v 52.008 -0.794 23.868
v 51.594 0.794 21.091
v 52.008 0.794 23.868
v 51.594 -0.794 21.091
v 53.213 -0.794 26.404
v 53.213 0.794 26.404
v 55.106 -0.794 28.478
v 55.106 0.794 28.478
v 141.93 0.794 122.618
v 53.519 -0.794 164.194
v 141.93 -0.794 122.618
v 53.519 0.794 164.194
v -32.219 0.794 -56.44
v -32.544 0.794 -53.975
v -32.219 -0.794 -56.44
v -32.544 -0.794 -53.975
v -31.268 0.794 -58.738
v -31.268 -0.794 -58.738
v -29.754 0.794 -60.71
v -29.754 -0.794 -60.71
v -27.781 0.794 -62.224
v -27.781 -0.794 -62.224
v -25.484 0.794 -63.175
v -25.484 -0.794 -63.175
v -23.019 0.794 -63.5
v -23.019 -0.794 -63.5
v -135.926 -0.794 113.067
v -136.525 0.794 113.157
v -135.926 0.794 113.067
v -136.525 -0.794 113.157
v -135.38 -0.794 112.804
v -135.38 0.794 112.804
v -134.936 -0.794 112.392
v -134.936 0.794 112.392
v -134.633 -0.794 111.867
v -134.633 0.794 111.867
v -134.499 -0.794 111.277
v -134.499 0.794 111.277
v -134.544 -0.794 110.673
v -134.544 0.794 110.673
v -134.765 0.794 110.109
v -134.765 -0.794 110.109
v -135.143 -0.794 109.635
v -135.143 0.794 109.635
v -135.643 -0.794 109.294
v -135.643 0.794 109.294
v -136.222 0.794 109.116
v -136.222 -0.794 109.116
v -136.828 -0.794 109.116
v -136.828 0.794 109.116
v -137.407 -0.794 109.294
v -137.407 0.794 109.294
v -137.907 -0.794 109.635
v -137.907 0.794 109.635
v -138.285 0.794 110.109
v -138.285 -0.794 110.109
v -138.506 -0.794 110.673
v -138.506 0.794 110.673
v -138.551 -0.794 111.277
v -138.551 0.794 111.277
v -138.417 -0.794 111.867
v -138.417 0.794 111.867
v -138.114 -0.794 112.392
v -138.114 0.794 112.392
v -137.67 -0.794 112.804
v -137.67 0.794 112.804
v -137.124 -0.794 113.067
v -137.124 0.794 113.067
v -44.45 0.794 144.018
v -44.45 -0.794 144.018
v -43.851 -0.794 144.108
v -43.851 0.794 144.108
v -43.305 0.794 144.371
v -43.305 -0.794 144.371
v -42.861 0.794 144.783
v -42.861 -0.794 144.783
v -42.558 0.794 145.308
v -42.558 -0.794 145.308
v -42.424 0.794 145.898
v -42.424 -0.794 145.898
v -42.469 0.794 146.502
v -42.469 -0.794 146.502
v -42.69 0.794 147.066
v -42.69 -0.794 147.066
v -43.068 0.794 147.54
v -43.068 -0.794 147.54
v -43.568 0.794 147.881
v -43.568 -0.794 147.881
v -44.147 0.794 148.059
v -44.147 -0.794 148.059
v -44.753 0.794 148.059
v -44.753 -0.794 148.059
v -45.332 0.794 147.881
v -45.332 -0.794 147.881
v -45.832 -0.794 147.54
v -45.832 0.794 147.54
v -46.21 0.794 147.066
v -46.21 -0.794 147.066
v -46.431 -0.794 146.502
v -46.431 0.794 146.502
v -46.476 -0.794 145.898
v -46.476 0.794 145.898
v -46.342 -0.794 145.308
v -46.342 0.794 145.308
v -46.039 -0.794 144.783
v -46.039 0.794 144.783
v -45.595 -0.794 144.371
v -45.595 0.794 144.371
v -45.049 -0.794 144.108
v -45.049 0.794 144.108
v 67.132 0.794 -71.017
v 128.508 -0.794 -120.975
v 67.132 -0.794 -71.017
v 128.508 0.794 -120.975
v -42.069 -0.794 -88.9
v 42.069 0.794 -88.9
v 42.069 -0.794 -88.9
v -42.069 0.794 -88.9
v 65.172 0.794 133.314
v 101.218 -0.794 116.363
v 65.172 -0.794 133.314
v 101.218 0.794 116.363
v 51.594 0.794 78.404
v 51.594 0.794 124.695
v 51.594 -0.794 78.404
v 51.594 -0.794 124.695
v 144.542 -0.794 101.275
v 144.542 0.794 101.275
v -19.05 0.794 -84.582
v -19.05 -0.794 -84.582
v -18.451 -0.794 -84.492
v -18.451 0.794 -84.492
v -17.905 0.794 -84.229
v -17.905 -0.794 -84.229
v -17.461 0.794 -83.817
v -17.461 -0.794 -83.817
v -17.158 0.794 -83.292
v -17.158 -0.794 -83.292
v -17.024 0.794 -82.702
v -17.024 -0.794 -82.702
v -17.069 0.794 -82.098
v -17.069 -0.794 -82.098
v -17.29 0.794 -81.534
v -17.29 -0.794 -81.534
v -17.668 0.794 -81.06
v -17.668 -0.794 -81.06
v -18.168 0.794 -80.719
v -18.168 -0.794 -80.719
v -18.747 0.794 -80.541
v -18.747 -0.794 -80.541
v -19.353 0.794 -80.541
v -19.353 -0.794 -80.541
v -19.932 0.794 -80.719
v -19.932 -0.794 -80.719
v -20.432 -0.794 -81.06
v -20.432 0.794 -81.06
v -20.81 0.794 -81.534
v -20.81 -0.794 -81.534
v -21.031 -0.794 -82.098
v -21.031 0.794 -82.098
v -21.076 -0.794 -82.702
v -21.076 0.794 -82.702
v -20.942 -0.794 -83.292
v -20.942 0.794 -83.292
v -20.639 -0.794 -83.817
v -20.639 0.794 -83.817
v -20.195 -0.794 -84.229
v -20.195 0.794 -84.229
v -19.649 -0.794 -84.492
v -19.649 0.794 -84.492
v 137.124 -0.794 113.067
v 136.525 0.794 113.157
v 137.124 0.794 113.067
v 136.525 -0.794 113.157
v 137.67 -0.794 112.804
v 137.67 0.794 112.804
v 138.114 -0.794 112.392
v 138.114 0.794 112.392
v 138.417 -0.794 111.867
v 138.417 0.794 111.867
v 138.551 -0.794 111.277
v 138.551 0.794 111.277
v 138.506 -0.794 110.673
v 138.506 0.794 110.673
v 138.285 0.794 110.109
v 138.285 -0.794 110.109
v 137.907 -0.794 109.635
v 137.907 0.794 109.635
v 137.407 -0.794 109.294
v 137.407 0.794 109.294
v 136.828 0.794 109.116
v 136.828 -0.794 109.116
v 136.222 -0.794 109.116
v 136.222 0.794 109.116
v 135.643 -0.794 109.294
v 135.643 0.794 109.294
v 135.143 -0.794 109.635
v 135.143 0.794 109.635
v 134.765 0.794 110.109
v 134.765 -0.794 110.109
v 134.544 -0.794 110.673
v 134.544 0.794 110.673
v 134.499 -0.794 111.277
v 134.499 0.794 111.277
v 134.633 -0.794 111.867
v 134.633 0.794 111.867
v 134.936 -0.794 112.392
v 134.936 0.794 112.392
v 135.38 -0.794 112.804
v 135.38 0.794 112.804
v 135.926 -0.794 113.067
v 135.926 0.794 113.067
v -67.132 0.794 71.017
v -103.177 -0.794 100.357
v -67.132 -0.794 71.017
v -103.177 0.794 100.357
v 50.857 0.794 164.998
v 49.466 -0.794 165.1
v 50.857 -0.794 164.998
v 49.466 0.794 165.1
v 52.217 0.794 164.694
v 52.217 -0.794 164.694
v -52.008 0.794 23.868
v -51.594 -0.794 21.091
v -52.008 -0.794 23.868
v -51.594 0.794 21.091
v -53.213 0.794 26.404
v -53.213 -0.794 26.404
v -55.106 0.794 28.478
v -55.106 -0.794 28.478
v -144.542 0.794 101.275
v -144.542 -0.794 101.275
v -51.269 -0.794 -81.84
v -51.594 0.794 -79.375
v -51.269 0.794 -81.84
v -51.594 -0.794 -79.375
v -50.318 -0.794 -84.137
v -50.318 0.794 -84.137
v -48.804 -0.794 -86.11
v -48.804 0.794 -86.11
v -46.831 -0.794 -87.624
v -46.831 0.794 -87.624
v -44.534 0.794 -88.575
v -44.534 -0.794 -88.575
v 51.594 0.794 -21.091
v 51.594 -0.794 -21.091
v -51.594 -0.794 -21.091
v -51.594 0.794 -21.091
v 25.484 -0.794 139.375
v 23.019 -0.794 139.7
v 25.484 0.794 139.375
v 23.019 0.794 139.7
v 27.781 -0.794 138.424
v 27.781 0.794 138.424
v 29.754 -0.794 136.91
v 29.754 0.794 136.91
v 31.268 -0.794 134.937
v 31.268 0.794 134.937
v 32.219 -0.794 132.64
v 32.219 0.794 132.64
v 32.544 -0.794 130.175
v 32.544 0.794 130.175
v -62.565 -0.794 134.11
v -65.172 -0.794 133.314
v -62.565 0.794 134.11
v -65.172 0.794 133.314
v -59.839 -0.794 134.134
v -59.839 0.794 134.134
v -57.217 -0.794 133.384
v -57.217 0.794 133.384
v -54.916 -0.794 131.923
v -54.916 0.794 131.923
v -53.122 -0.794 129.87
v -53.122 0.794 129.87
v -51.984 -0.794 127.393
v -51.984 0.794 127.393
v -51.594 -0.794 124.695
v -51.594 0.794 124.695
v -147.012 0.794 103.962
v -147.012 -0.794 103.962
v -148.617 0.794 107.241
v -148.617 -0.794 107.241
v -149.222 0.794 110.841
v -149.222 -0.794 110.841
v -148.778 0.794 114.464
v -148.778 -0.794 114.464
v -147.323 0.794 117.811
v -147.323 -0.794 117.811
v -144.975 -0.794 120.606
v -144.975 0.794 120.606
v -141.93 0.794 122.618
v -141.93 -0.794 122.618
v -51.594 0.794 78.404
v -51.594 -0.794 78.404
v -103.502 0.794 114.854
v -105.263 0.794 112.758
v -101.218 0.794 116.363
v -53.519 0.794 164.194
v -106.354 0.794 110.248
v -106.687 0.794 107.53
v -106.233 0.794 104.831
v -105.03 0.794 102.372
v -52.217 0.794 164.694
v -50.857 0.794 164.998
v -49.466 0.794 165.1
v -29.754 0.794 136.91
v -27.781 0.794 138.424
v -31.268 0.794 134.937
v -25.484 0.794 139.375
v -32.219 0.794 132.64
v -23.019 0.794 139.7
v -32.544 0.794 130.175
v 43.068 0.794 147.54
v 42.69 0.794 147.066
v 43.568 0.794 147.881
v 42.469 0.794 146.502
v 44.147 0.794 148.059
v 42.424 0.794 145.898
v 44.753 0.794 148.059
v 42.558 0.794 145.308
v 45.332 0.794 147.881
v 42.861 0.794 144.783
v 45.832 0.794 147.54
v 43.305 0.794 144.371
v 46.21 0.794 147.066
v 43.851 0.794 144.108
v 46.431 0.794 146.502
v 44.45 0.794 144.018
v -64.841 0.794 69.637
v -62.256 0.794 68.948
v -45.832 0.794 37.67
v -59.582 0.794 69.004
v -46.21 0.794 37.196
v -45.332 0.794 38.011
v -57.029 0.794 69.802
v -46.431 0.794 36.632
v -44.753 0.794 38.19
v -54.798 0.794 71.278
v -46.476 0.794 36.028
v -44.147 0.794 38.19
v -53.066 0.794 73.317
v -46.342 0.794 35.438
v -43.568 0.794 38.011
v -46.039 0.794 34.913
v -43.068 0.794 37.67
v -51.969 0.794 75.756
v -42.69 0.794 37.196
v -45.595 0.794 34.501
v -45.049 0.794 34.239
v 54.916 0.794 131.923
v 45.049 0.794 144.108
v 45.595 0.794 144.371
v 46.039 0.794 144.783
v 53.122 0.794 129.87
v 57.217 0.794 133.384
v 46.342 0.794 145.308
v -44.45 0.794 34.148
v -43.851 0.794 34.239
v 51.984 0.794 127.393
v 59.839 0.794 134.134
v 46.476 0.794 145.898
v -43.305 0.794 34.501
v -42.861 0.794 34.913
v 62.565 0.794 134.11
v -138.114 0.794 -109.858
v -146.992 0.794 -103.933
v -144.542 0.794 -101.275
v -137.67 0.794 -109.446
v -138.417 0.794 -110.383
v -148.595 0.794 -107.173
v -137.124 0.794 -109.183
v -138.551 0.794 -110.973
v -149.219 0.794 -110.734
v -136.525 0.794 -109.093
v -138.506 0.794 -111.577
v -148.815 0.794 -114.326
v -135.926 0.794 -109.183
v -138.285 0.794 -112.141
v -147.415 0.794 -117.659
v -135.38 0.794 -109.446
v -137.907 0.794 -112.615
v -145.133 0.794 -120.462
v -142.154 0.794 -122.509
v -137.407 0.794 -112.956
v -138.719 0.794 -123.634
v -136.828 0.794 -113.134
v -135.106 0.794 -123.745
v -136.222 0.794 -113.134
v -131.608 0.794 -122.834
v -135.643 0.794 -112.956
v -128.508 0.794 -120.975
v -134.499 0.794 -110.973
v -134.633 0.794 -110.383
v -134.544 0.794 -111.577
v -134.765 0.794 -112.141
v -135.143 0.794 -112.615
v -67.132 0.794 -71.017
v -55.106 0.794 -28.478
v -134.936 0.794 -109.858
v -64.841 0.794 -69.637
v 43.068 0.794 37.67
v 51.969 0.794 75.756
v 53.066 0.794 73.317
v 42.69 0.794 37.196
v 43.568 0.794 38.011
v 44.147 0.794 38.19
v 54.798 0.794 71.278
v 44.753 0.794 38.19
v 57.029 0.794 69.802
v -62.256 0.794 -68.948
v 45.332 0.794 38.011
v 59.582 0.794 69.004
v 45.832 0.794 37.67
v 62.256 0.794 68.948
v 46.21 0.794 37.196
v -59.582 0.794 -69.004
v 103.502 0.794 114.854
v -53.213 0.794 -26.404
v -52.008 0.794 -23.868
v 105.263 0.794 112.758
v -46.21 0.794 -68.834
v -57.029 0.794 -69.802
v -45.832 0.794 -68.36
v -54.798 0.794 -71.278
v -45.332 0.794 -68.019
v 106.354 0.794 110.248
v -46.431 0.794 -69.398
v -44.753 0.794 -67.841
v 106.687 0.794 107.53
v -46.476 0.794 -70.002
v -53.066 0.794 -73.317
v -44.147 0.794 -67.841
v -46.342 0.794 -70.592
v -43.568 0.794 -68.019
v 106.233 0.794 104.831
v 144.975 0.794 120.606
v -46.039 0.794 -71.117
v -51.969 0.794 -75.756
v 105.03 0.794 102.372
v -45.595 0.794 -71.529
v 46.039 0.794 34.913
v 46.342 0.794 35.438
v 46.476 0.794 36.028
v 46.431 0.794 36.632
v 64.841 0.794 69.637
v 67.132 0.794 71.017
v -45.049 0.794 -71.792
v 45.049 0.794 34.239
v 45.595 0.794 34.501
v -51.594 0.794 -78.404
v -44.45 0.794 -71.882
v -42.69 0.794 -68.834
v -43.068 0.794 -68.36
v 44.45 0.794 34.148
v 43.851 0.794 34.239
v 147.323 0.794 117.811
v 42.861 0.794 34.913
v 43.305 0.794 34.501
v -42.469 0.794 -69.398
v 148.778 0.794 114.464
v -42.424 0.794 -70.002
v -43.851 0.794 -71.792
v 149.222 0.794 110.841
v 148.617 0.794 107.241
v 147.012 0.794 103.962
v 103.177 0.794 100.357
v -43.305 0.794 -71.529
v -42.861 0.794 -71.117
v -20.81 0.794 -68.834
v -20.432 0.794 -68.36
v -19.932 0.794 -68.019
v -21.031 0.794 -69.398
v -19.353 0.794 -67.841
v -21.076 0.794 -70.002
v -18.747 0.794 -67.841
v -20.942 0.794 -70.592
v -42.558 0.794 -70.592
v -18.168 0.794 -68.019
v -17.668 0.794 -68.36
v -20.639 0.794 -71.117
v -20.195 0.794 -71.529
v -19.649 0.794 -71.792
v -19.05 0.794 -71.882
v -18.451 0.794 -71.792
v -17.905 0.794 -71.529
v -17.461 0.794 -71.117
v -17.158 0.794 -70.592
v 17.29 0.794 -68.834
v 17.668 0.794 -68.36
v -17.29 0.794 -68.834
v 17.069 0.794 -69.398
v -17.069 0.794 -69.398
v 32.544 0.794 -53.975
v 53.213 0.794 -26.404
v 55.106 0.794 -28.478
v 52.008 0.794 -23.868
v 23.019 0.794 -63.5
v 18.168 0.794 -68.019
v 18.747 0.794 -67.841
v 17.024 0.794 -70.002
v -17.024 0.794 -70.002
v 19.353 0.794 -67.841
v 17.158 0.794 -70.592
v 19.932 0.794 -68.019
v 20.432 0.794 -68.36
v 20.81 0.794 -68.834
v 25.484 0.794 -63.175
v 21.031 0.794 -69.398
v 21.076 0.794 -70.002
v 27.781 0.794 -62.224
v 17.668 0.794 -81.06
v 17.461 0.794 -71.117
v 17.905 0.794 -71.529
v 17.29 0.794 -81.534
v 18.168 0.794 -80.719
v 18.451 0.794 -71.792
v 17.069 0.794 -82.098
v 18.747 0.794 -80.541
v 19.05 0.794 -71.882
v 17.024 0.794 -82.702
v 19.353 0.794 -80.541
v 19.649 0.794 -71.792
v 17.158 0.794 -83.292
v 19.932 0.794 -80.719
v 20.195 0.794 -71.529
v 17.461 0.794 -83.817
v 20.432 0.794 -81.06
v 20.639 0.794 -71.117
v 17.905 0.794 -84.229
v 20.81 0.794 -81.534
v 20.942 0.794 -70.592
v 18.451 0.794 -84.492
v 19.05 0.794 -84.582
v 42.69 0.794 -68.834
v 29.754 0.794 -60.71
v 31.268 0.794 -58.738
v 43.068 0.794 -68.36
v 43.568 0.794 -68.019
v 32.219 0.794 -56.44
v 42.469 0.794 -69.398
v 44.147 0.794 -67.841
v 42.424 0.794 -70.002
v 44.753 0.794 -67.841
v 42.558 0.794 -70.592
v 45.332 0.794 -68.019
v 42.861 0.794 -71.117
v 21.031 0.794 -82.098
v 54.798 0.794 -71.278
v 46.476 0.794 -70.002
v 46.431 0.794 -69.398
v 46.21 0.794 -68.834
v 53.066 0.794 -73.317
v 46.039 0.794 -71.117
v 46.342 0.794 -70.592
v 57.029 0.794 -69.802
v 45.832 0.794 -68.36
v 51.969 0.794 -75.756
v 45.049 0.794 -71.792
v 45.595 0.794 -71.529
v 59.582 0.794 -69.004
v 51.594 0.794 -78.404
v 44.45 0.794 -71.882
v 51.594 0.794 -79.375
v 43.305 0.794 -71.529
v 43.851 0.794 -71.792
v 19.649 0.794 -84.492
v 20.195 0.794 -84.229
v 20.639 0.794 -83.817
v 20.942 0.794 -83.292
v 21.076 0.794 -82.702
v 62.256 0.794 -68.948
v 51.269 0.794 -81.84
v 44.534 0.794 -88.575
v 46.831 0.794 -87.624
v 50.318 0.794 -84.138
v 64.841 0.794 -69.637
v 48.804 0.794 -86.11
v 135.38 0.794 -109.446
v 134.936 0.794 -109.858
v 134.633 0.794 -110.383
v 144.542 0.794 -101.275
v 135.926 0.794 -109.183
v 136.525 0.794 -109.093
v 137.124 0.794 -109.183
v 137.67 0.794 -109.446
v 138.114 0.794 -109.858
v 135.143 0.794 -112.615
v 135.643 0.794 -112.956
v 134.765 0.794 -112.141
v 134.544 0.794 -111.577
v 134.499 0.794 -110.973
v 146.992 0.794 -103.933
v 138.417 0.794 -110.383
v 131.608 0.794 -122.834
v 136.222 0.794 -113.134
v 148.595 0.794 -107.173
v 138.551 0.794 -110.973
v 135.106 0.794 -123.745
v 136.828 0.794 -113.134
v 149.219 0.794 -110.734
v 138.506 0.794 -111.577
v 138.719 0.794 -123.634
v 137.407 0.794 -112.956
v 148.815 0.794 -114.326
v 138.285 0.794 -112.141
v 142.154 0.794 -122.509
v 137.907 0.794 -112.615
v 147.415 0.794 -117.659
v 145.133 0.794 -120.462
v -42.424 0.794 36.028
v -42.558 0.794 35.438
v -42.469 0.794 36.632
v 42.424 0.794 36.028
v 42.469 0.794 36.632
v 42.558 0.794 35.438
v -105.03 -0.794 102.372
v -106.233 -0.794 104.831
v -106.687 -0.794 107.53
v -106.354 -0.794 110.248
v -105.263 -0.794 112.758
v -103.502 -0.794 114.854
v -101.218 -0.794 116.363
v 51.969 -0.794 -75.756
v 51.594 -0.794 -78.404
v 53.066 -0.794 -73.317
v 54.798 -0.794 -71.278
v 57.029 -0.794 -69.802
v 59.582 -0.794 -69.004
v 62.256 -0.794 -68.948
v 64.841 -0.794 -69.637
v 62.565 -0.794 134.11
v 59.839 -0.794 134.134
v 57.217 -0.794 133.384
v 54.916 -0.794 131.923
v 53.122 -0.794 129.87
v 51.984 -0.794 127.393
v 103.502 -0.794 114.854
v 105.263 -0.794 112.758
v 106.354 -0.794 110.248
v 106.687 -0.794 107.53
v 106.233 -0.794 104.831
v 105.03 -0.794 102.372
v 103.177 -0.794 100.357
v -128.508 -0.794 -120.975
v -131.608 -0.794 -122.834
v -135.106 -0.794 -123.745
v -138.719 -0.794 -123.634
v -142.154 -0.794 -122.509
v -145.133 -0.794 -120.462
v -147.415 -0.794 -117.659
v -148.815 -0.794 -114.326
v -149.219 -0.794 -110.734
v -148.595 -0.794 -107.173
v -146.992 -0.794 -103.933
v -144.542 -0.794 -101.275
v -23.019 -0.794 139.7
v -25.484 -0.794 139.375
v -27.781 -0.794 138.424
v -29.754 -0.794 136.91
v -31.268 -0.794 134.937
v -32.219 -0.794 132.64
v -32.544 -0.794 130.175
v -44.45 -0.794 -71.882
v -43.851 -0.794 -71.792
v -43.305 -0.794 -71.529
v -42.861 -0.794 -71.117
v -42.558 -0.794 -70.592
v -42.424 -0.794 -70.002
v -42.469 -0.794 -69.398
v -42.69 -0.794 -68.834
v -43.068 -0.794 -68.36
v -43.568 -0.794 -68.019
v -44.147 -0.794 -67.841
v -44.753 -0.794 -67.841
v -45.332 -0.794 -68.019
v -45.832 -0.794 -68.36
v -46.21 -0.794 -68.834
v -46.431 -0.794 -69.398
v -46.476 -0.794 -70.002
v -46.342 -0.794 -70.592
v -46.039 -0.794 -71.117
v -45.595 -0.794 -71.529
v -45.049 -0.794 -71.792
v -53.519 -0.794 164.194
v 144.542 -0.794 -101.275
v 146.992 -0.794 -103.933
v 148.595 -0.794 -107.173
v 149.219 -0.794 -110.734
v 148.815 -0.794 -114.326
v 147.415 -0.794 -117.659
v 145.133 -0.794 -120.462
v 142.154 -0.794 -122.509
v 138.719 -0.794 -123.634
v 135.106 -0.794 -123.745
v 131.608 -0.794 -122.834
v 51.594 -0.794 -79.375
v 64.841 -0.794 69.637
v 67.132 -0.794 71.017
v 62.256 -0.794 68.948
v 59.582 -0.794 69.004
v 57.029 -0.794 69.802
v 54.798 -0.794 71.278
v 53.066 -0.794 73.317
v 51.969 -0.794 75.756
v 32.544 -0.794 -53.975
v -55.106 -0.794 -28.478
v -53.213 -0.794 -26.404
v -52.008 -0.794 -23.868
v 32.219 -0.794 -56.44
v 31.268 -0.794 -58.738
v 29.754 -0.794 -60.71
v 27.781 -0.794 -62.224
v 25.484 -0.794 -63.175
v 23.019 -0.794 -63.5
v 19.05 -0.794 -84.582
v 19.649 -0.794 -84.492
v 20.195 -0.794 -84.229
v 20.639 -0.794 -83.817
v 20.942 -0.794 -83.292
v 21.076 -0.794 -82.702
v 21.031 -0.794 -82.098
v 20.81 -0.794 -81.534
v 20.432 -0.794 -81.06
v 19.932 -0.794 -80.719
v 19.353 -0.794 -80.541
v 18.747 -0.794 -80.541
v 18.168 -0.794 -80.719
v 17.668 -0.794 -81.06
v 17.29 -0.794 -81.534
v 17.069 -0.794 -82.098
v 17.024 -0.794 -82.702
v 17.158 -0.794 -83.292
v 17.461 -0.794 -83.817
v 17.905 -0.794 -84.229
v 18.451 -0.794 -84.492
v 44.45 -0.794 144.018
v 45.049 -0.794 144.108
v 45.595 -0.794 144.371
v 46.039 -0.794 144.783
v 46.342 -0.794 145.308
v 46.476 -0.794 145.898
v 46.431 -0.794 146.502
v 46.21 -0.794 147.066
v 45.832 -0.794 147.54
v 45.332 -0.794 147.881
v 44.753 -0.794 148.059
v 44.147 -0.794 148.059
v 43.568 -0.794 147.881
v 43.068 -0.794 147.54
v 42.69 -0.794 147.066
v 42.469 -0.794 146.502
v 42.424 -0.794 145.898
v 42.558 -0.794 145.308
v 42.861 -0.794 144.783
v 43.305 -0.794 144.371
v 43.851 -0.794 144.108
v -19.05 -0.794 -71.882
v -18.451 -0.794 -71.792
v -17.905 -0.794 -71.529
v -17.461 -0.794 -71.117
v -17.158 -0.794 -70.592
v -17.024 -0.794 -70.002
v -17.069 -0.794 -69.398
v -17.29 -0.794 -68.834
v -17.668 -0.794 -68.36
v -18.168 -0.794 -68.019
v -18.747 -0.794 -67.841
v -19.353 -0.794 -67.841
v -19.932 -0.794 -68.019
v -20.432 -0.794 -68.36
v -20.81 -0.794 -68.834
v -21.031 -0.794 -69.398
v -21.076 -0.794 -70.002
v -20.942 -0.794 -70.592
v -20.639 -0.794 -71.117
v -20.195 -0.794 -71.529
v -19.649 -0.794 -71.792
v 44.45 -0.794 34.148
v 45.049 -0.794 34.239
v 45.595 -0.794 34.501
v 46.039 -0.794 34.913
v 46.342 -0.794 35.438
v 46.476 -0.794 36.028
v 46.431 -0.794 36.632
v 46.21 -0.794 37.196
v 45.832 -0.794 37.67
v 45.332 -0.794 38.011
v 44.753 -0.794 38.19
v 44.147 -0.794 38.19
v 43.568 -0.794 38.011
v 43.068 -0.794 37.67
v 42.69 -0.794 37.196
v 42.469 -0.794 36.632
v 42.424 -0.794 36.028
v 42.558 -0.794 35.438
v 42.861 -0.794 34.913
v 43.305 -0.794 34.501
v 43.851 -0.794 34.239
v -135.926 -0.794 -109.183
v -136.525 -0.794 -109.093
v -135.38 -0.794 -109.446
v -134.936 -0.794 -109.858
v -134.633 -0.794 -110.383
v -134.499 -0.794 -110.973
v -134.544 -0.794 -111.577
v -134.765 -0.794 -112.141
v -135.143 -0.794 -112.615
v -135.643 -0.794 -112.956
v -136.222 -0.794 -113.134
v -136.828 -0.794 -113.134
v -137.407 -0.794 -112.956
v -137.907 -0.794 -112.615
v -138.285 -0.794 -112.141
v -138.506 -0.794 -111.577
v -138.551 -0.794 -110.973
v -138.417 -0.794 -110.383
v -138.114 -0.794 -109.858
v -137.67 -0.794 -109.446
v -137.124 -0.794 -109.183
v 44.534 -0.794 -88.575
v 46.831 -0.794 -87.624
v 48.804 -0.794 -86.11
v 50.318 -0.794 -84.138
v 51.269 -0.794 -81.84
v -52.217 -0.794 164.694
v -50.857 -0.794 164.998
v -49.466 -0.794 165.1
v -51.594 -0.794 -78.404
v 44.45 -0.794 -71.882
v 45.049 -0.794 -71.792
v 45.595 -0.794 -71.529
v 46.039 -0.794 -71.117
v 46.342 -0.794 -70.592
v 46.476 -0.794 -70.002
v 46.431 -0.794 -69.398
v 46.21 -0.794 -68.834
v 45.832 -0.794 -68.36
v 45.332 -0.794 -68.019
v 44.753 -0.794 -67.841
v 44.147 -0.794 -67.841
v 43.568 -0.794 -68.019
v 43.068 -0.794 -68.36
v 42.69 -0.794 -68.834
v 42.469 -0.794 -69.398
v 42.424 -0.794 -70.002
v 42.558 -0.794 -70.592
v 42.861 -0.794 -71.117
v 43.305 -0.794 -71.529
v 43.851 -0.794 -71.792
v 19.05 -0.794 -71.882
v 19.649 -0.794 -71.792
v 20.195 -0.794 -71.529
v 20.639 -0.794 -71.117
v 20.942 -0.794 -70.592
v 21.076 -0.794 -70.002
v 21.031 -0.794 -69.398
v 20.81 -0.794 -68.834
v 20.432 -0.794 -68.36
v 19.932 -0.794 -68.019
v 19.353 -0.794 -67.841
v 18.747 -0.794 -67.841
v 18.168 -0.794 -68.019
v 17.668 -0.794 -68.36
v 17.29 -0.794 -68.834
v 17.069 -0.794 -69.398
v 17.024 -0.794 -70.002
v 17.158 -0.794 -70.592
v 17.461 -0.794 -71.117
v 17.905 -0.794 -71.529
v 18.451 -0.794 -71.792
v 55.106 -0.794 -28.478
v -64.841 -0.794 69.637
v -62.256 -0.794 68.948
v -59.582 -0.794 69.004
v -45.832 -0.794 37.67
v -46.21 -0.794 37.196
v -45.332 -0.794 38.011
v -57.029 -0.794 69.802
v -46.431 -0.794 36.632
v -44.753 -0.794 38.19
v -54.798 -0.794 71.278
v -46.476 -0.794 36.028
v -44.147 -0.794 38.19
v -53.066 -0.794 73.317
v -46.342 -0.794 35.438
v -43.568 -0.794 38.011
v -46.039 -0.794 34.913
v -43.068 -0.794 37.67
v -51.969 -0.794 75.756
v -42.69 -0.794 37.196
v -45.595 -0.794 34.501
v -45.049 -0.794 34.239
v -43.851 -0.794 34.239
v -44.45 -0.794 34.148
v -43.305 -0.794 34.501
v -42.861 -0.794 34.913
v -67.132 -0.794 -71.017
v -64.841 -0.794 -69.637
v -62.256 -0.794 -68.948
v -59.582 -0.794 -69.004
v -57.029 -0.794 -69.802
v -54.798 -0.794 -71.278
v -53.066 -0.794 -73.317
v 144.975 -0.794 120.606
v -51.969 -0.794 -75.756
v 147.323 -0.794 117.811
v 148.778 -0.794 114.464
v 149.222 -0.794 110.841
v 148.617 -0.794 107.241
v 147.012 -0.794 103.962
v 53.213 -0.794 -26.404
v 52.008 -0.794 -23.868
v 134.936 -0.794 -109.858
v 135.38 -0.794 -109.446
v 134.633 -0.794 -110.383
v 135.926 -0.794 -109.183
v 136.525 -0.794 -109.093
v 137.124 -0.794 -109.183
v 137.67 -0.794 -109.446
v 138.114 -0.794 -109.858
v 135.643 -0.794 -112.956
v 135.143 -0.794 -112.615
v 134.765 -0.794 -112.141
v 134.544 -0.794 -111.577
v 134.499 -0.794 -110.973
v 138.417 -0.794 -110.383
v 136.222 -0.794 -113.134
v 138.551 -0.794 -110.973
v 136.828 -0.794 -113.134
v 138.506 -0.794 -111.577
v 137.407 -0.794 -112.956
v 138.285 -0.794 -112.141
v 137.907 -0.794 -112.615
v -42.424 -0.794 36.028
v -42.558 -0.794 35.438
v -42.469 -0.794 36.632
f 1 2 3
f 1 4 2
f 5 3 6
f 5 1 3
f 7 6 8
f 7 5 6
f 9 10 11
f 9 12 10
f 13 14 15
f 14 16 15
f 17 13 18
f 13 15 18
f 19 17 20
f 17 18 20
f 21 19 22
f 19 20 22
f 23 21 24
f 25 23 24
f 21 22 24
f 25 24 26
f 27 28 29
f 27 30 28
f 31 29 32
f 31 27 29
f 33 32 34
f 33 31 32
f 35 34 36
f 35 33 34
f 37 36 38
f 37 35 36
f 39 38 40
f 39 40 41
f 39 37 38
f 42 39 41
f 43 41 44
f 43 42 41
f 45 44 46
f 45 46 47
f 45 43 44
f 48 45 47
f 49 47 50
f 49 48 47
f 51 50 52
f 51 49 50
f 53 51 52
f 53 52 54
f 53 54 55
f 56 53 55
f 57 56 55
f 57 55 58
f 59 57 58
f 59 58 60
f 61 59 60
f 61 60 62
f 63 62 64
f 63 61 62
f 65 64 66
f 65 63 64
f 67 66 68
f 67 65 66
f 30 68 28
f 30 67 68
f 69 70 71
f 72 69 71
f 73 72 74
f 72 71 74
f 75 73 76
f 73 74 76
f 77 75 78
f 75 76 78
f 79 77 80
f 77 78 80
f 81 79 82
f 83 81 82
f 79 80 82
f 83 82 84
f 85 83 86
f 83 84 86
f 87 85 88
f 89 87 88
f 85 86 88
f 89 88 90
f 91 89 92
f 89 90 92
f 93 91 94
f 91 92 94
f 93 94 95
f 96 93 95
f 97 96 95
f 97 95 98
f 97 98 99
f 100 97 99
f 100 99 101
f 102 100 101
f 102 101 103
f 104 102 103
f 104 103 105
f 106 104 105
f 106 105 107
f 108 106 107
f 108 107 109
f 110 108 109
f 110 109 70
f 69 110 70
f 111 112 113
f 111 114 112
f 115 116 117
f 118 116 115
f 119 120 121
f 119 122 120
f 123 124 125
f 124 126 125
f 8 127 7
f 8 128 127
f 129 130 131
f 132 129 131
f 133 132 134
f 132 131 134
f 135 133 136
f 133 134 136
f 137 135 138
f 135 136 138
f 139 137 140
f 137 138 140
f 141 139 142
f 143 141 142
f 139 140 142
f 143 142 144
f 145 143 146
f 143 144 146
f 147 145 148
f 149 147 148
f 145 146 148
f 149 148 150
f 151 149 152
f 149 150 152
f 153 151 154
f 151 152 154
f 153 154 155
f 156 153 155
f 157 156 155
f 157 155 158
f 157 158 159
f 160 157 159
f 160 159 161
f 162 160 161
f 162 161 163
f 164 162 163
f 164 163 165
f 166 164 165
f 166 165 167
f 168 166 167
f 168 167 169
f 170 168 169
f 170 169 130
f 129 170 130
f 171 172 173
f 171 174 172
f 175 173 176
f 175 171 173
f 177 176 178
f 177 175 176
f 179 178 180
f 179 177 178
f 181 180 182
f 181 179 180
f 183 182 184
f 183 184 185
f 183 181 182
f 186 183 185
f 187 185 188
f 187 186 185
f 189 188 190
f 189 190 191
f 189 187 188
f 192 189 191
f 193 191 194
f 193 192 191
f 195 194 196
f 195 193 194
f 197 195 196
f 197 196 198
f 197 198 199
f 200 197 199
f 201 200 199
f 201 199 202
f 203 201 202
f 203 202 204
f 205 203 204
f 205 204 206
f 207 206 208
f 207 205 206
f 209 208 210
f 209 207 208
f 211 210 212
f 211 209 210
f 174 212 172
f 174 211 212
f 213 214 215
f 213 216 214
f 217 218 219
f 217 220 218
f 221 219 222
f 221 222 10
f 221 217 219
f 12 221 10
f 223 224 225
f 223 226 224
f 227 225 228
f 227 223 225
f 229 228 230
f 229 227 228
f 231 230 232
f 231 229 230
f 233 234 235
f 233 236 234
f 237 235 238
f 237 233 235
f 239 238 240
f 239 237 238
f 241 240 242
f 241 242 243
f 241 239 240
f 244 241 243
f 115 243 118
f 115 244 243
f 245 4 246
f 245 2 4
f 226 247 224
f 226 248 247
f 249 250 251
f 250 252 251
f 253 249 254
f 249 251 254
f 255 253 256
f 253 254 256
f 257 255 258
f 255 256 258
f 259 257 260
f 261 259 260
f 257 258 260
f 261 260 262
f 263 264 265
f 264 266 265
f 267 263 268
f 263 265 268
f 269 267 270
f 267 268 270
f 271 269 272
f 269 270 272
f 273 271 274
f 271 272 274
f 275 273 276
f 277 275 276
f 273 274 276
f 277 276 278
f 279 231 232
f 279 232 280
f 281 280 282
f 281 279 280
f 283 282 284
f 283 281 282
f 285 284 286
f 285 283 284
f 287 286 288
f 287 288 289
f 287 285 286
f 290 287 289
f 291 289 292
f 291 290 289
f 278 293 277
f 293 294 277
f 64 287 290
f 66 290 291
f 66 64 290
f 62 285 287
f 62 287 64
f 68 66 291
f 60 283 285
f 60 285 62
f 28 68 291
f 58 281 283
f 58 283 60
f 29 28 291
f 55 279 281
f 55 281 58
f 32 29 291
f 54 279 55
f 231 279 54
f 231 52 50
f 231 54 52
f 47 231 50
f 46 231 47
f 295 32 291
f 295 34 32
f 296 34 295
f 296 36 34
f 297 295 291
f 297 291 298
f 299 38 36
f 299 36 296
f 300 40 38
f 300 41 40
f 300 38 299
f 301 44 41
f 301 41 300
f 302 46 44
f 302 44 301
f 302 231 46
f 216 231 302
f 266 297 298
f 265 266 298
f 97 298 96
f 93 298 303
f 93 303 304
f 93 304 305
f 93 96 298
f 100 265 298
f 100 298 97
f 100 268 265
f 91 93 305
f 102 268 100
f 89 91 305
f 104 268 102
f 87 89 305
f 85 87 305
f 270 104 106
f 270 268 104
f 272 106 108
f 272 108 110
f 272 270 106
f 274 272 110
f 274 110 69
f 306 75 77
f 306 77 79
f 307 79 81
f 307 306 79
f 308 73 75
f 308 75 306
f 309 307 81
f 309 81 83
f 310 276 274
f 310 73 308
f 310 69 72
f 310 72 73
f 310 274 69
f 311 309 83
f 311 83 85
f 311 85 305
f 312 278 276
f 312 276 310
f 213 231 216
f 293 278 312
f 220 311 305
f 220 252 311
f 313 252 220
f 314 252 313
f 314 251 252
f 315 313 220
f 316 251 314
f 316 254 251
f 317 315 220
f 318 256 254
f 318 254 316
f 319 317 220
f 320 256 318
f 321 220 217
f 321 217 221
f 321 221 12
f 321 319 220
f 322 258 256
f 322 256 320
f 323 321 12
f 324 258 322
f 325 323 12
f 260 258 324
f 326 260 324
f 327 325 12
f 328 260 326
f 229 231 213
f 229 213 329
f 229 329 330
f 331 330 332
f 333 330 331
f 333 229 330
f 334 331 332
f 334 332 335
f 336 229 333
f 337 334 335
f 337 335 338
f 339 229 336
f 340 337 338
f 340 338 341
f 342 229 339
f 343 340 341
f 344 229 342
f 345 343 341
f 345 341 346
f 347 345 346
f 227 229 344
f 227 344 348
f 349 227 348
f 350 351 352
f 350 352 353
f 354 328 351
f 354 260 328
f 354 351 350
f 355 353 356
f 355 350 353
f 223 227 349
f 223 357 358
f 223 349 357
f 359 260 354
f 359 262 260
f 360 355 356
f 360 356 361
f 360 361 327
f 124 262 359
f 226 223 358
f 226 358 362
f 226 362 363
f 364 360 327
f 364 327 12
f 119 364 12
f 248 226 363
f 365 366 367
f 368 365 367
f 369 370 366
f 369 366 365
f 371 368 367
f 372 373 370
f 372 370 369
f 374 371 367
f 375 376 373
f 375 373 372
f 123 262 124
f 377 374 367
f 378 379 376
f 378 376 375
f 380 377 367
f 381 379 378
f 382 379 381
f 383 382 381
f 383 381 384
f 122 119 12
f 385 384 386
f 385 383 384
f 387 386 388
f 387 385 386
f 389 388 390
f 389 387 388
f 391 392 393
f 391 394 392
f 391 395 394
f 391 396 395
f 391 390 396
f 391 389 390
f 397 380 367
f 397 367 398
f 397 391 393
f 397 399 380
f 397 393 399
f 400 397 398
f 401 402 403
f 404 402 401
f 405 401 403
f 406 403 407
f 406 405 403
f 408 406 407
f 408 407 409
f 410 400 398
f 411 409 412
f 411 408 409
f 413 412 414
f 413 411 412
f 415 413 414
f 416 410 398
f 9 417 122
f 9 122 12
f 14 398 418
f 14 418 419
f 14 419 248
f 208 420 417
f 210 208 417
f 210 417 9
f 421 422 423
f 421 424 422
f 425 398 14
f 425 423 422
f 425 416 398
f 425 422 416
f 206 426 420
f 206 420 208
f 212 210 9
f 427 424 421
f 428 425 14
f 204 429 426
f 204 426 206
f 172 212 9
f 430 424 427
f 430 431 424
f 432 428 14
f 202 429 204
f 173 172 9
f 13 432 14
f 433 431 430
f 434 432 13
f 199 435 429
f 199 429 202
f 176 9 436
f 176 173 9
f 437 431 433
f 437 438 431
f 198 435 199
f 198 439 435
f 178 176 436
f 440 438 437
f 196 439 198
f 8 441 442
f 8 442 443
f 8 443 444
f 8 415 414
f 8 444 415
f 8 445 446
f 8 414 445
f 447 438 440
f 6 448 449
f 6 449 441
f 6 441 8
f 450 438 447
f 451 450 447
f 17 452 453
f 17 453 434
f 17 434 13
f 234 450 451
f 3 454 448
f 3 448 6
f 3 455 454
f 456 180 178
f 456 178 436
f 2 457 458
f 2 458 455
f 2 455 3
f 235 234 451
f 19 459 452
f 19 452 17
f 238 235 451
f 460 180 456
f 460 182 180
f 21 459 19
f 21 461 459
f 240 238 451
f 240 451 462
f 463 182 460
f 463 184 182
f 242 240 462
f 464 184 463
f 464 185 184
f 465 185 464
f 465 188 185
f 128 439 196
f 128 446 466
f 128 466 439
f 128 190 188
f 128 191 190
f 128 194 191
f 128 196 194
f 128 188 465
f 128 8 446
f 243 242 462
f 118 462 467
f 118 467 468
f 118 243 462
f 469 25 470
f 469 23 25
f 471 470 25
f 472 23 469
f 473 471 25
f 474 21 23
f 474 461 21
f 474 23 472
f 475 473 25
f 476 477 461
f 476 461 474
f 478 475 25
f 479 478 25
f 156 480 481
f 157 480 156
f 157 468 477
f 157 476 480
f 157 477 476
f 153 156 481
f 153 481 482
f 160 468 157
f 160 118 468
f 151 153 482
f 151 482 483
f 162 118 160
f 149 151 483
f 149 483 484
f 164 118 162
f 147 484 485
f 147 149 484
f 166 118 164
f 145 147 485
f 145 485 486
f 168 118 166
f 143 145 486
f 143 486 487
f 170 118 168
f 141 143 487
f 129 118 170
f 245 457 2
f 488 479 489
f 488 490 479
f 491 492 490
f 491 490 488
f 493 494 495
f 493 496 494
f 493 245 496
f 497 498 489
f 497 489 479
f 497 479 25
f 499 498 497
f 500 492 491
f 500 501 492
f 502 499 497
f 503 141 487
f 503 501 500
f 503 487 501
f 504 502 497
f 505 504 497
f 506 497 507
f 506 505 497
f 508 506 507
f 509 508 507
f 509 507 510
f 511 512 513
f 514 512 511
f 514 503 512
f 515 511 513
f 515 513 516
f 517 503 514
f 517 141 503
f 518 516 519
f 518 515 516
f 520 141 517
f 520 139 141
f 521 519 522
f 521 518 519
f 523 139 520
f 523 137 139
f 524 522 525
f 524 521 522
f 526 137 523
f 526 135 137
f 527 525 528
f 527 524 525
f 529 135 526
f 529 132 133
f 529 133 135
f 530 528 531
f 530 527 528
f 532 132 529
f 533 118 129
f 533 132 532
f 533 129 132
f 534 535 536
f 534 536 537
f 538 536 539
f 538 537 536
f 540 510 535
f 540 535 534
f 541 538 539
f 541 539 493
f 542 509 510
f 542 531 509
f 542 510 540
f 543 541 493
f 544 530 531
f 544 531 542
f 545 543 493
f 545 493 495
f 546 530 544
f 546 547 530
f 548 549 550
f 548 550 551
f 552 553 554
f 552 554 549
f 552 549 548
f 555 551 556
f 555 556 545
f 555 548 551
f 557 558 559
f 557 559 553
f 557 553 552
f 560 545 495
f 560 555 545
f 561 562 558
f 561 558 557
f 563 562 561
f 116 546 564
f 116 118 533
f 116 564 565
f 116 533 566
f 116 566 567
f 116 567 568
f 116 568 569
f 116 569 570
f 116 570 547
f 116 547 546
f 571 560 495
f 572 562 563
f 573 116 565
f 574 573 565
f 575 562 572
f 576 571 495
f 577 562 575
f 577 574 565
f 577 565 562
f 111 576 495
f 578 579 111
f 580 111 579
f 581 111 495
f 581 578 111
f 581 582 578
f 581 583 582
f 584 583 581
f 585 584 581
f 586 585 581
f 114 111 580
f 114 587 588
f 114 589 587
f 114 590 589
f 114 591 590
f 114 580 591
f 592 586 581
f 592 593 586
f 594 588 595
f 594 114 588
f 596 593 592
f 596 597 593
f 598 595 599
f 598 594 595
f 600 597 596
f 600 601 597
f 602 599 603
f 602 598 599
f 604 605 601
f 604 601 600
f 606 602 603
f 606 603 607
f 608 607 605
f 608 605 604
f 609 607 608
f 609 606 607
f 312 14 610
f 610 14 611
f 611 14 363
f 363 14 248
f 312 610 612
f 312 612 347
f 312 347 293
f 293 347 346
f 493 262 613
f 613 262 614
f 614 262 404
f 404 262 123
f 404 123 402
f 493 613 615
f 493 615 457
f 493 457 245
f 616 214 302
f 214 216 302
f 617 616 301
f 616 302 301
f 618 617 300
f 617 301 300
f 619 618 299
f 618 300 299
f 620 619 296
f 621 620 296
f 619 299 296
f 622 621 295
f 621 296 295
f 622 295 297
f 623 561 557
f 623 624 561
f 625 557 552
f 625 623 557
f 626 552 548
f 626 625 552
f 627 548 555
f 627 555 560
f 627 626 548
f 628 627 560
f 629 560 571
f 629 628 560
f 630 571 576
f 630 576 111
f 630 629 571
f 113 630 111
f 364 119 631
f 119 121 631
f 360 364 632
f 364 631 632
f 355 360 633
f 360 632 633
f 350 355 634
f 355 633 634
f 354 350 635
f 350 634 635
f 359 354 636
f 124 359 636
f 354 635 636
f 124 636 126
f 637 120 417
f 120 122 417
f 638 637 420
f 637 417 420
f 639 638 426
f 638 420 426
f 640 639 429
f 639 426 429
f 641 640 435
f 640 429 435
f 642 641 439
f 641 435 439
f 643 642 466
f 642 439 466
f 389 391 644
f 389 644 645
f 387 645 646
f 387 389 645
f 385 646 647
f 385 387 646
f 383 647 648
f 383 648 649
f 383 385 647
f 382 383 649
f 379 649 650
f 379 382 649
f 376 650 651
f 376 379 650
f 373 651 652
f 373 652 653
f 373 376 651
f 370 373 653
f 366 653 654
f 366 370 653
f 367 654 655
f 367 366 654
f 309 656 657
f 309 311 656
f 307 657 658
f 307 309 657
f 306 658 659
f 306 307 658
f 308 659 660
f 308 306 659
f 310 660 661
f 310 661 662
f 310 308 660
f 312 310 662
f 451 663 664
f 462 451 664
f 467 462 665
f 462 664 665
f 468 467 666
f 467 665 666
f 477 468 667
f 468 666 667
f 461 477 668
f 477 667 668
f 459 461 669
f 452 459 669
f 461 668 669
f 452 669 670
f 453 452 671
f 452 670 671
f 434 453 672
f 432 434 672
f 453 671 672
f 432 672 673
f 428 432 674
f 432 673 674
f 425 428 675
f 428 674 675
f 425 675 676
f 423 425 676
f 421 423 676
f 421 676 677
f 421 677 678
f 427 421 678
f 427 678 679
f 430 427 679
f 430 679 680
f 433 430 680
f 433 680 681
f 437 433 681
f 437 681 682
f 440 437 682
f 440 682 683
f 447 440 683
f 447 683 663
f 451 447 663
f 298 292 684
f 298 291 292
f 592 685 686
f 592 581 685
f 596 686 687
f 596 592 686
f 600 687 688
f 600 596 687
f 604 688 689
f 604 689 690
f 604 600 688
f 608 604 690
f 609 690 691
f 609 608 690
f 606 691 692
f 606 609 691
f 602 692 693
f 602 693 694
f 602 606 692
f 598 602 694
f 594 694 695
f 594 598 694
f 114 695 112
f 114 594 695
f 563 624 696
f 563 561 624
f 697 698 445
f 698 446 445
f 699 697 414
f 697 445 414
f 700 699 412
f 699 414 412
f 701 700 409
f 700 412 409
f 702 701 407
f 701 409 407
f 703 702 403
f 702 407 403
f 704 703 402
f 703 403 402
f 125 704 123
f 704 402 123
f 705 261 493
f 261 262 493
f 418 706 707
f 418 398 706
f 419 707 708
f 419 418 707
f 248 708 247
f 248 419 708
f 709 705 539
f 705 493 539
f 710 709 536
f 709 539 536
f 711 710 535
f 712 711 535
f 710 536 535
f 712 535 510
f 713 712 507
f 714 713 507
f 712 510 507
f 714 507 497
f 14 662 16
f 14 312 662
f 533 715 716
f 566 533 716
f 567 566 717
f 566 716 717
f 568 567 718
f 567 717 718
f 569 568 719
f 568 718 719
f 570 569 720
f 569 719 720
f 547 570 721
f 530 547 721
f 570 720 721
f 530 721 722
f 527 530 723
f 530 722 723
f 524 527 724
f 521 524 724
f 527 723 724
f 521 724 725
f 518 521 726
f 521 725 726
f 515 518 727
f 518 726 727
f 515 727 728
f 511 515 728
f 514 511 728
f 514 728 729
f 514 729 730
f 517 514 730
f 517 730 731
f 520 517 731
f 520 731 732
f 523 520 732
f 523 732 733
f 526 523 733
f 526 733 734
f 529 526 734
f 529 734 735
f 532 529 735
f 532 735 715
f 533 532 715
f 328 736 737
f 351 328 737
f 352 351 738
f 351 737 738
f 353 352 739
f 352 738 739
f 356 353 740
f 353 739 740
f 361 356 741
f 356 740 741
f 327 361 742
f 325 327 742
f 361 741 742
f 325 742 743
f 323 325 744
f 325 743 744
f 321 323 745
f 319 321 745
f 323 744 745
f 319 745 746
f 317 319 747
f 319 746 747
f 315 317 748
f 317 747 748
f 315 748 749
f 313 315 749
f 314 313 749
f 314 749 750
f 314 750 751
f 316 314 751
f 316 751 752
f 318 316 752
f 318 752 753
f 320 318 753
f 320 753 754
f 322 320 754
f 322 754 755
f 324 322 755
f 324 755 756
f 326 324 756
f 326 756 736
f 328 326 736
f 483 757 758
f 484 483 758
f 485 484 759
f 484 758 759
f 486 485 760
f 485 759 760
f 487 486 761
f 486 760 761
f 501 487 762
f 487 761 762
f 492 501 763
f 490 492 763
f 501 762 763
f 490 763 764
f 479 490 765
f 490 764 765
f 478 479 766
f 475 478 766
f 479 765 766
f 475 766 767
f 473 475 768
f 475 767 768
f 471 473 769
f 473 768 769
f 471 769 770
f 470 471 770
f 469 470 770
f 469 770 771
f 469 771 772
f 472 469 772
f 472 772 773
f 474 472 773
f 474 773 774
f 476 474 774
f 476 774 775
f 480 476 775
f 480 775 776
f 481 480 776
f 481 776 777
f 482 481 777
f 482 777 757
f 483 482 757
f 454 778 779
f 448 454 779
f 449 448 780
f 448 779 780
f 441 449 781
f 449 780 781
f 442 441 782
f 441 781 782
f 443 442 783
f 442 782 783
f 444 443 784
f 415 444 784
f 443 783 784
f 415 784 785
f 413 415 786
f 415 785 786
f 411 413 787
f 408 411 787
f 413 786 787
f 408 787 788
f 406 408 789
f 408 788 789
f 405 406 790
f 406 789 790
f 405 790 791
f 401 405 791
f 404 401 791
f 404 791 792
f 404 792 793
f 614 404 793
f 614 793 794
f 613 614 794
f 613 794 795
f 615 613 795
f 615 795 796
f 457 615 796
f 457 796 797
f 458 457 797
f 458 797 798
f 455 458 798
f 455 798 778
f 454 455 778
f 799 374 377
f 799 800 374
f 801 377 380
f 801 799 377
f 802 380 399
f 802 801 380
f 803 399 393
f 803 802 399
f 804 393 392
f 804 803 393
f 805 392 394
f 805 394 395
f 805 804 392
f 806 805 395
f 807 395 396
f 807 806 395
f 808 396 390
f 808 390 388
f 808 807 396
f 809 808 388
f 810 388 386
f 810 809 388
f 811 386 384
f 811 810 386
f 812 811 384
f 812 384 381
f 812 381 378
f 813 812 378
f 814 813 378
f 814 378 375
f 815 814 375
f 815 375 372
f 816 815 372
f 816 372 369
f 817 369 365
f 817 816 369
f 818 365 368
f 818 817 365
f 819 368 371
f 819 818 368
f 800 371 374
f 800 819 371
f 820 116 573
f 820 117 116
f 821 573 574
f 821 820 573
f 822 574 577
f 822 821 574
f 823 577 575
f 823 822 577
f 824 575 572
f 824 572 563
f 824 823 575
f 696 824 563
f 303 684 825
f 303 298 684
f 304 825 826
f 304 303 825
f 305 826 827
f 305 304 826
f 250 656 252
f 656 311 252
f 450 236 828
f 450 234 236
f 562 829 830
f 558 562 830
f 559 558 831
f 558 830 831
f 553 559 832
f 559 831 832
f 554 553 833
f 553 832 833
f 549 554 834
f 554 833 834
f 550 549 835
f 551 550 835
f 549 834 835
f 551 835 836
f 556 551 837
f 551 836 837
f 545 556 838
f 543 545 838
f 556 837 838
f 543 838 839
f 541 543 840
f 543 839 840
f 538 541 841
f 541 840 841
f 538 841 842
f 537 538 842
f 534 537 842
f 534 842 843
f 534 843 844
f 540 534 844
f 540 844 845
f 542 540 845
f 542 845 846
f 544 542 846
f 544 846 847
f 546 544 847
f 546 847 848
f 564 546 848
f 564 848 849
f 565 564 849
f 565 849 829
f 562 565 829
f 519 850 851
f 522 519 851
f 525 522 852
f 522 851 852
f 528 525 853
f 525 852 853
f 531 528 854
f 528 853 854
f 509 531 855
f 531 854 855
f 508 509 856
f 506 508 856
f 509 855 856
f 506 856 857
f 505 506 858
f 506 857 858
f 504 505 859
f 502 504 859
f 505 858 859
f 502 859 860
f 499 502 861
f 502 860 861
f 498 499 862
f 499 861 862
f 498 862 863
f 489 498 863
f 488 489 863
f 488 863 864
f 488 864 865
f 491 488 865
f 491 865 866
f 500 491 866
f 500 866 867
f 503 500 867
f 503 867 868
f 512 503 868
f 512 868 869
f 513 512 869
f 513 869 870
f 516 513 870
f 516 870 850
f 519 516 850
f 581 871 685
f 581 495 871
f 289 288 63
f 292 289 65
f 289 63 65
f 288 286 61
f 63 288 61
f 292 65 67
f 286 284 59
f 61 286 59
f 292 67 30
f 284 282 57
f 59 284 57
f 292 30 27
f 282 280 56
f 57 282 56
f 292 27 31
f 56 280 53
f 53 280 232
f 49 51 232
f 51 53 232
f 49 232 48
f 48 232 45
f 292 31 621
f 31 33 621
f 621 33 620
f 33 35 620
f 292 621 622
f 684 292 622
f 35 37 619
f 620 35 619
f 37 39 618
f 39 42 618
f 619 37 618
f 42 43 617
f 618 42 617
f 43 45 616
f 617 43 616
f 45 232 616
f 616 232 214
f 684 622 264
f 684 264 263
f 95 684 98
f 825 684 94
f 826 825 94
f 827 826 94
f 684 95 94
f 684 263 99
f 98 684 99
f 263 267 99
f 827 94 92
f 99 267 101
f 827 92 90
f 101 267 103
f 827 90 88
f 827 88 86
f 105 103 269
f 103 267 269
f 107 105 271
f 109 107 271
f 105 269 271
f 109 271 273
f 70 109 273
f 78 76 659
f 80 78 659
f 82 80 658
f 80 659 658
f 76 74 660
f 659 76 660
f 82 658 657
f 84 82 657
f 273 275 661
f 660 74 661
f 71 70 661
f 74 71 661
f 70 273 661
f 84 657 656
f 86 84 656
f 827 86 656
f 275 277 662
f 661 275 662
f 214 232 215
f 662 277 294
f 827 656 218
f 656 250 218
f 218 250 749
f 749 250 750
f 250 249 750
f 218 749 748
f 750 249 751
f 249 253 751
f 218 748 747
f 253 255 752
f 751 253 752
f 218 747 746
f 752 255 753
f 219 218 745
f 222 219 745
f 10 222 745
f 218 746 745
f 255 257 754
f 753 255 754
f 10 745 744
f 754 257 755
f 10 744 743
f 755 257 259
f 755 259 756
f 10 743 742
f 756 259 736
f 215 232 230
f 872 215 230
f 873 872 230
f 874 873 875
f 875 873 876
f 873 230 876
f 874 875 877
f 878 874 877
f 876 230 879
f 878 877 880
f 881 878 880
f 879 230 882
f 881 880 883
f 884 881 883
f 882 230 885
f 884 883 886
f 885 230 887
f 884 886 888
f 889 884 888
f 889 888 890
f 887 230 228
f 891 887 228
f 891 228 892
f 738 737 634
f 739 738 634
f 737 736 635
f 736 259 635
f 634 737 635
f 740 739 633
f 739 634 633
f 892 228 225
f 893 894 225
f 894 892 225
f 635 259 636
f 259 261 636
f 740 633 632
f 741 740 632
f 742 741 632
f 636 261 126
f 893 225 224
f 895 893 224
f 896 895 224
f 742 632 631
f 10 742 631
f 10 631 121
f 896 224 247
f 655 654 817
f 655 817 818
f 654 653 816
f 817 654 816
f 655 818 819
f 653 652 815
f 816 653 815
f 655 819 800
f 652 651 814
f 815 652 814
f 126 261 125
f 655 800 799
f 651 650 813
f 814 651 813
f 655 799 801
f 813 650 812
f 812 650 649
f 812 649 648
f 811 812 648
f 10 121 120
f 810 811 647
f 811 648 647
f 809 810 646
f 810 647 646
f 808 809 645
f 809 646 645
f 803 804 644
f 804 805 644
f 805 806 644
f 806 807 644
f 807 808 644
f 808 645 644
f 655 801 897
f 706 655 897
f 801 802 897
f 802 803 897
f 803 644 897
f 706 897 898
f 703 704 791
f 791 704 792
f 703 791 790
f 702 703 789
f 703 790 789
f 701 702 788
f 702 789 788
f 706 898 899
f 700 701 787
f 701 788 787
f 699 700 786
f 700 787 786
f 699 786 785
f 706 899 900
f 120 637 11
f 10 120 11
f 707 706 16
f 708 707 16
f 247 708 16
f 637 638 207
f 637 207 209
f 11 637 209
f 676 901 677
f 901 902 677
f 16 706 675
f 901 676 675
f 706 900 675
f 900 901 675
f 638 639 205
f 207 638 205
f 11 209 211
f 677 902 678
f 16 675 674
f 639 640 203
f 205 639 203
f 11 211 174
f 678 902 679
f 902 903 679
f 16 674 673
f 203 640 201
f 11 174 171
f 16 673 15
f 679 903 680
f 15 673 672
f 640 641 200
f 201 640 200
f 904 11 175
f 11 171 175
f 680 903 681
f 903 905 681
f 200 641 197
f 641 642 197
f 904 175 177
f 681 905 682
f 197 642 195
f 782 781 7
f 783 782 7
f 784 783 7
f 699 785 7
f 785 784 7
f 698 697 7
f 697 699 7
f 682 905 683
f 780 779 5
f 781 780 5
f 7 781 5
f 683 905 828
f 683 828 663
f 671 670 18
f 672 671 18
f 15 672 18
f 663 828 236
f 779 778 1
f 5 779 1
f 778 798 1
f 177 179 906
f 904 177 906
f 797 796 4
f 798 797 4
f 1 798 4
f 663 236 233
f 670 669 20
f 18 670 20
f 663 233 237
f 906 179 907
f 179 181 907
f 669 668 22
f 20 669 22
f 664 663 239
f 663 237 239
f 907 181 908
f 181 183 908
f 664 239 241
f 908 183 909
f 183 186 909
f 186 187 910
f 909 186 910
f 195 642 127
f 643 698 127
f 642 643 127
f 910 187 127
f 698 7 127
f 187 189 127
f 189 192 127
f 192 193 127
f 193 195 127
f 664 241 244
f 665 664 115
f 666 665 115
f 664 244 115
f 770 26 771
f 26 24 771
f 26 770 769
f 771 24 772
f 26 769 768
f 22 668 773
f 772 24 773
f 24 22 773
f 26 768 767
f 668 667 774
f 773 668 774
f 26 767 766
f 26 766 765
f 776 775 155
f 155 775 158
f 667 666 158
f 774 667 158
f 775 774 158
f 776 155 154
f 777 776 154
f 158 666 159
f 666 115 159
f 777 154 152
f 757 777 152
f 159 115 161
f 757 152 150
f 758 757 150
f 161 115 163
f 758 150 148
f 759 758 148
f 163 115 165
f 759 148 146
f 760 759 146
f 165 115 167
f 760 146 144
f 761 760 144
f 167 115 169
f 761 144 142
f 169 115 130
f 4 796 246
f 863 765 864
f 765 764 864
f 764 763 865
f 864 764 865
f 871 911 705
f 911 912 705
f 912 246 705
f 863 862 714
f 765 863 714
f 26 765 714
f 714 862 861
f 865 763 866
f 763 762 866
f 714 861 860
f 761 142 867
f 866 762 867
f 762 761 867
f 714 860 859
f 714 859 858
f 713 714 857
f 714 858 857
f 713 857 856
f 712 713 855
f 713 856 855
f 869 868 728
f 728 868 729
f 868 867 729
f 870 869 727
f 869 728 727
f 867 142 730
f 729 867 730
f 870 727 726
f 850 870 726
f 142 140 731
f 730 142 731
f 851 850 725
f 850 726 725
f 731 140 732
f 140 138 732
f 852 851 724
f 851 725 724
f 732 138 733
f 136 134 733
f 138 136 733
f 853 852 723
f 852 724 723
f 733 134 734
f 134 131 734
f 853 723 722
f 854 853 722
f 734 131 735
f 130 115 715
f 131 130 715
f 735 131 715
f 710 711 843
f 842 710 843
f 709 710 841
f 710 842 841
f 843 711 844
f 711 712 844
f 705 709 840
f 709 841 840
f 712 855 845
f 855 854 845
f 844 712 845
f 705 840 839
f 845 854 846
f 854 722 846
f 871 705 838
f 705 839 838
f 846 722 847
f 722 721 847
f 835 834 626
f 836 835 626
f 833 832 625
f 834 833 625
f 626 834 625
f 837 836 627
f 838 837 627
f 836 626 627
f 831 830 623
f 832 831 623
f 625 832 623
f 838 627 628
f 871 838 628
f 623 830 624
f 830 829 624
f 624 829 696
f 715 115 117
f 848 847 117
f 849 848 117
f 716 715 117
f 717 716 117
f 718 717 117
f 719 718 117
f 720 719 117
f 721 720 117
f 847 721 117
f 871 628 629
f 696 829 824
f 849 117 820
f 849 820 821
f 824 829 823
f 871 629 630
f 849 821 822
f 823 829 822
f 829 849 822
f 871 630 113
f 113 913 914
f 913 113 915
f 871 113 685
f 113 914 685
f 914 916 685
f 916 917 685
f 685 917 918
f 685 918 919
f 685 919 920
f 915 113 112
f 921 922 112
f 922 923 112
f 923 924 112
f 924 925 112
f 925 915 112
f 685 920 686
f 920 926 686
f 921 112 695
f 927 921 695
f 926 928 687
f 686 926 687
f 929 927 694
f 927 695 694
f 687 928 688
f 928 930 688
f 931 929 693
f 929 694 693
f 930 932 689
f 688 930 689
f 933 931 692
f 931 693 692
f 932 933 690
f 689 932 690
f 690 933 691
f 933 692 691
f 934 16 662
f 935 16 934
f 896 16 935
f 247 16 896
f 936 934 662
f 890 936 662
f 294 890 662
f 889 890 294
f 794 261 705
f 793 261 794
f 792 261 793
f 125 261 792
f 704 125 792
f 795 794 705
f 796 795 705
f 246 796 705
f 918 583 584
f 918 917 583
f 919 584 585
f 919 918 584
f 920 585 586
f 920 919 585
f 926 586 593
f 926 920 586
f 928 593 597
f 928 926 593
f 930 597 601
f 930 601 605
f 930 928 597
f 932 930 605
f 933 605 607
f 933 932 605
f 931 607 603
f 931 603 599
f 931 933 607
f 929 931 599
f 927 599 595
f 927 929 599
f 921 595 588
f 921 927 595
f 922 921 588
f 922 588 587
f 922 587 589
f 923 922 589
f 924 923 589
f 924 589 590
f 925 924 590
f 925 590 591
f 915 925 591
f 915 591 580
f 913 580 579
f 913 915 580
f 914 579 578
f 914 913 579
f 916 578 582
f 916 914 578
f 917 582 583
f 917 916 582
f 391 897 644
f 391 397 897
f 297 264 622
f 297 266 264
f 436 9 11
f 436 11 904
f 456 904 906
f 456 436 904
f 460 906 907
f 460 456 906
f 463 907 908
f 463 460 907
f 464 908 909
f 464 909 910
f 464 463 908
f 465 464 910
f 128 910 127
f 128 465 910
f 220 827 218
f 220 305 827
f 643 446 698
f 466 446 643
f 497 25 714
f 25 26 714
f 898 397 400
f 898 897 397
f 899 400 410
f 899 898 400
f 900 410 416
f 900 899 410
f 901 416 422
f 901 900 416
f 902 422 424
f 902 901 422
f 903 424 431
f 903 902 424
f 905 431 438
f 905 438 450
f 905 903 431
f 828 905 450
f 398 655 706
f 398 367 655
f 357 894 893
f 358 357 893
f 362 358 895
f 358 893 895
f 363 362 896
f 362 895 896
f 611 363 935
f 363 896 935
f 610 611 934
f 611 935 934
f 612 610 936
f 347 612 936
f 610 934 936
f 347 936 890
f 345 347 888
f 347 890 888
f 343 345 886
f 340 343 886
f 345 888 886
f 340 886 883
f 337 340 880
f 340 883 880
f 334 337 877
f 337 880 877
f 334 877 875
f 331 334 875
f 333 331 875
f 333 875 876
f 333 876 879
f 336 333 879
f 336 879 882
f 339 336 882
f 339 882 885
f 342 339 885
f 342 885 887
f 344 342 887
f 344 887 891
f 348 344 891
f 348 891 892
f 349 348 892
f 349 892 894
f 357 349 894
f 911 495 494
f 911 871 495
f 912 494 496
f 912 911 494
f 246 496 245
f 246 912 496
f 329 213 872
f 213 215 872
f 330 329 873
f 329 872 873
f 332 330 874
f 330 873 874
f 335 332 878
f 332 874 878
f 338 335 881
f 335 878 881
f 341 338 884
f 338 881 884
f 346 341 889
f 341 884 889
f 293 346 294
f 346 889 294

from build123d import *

# Parameters (mm, degrees)
SKETCH2_R           = 2.032
SKETCH2_W           = 65.0875
SKETCH2_H           = 203.2
BOSS_EXTRUDE1_DEPTH = 0.79375
SKETCH3_R           = 2.032
CUT_EXTRUDE1_DEPTH  = 223.550288208
FILLET1_R           = 9.525


with BuildPart() as part:
    # Sketch2 → Boss-Extrude1 (new, symmetric)
    with BuildSketch(Plane(origin=(0, 0, 0), x_dir=(1, 0, 0), z_dir=(0, 1, 0))):
        with BuildLine():
            Line((-51.59375, 58.370134809), (-128.507853241, 120.974637447))
            ThreePointArc((-128.507853241, 120.974637447), (-146.374637447, 119.142146759), (-144.542146759, 101.275362553))
            Line((-144.542146759, 101.275362553), (-51.59375, 25.619690772))
            Line((-51.59375, 25.619690772), (-51.59375, -25.619690772))
            Line((-51.59375, -25.619690772), (-144.542146759, -101.275362553))
            ThreePointArc((-144.542146759, -101.275362553), (-149.130906335, -112.668089589), (-141.929642552, -122.617599309))
            Line((-141.929642552, -122.617599309), (-51.59375, -165.1))
            Line((-51.59375, -165.1), (51.59375, -165.1))
            Line((51.59375, -165.1), (141.929642552, -122.617599309))
            ThreePointArc((141.929642552, -122.617599309), (149.130906335, -112.668089589), (144.542146759, -101.275362553))
            Line((144.542146759, -101.275362553), (51.59375, -25.619690772))
            Line((51.59375, -25.619690772), (51.59375, 25.619690772))
            Line((51.59375, 25.619690772), (144.542146759, 101.275362553))
            ThreePointArc((144.542146759, 101.275362553), (146.374637447, 119.142146759), (128.507853241, 120.974637447))
            Line((128.507853241, 120.974637447), (51.59375, 58.370134809))
            Line((51.59375, 58.370134809), (51.59375, 88.9))
            Line((51.59375, 88.9), (-51.59375, 88.9))
            Line((-51.59375, 88.9), (-51.59375, 58.370134809))
        make_face()
        with Locations(Location((-136.525, -111.125, 0), (0, 0, 270))):
            Circle(SKETCH2_R, mode=Mode.SUBTRACT)
        Polygon((-51.59375, -58.370134809), (-51.59375, -139.7), (-114.923666817, -109.917741521), align=None, mode=Mode.SUBTRACT)
        Polygon((51.59375, -139.7), (51.59375, -58.370134809), (114.923666817, -109.917741521), align=None, mode=Mode.SUBTRACT)
        with Locations(Location((136.525, -111.125, 0), (0, 0, 270))):
            Circle(SKETCH2_R, mode=Mode.SUBTRACT)
        with Locations((0, -38.1)):
            Rectangle(SKETCH2_W, SKETCH2_H, mode=Mode.SUBTRACT)
        with Locations(Location((-136.525, 111.125, 0), (0, 0, 270))):
            Circle(SKETCH2_R, mode=Mode.SUBTRACT)
        with Locations(Location((136.525, 111.125, 0), (0, 0, 270))):
            Circle(SKETCH2_R, mode=Mode.SUBTRACT)
    extrude(amount=BOSS_EXTRUDE1_DEPTH, both=True)

    # Sketch3 → Cut-Extrude1 (cut, through all)
    with BuildSketch(Plane.XZ.offset(0.79375)):
        with Locations(Location((44.45, 146.05, 0), (0, 0, 270))):
            Circle(SKETCH3_R)
        with Locations(Location((-44.45, 146.05, 0), (0, 0, 270))):
            Circle(SKETCH3_R)
        with Locations(Location((44.45, -69.85, 0), (0, 0, 270))):
            Circle(SKETCH3_R)
        with Locations(Location((-44.45, -69.85, 0), (0, 0, 270))):
            Circle(SKETCH3_R)
        with Locations(Location((-19.05, -69.85, 0), (0, 0, 270))):
            Circle(SKETCH3_R)
        with Locations(Location((19.05, -69.85, 0), (0, 0, 270))):
            Circle(SKETCH3_R)
        with Locations(Location((-19.05, -82.55, 0), (0, 0, 270))):
            Circle(SKETCH3_R)
        with Locations(Location((19.05, -82.55, 0), (0, 0, 270))):
            Circle(SKETCH3_R)
        with Locations(Location((-44.45, 36.180232558, 0), (0, 0, 270))):
            Circle(SKETCH3_R)
        with Locations(Location((44.45, 36.180232558, 0), (0, 0, 270))):
            Circle(SKETCH3_R)
    extrude(amount=-CUT_EXTRUDE1_DEPTH, mode=Mode.SUBTRACT)

    # Fillet1
    fillet1_edges = [part.edges().sort_by_distance(p)[0] for p in [
        (-51.59375, 0, 58.370134809),
        (-114.923666817, 0, 109.917741521),
        (-51.59375, 0, 139.7),
        (32.54375, 0, -63.5),
        (-32.54375, 0, -63.5),
        (-32.54375, 0, 139.7),
        (32.54375, 0, 139.7),
        (51.59375, 0, 58.370134809),
        (51.59375, 0, 139.7),
        (114.923666817, 0, 109.917741521),
        (-51.59375, 0, 25.619690772),
        (-51.59375, 0, -25.619690772),
        (-51.59375, 0, -58.370134809),
        (-51.59375, 0, -88.9),
        (51.59375, 0, -88.9),
        (51.59375, 0, -58.370134809),
        (51.59375, 0, -25.619690772),
        (51.59375, 0, 25.619690772),
        (51.59375, 0, 165.1),
        (-51.59375, 0, 165.1),
    ]]
    fillet(fillet1_edges, radius=FILLET1_R)


solid = part.part
